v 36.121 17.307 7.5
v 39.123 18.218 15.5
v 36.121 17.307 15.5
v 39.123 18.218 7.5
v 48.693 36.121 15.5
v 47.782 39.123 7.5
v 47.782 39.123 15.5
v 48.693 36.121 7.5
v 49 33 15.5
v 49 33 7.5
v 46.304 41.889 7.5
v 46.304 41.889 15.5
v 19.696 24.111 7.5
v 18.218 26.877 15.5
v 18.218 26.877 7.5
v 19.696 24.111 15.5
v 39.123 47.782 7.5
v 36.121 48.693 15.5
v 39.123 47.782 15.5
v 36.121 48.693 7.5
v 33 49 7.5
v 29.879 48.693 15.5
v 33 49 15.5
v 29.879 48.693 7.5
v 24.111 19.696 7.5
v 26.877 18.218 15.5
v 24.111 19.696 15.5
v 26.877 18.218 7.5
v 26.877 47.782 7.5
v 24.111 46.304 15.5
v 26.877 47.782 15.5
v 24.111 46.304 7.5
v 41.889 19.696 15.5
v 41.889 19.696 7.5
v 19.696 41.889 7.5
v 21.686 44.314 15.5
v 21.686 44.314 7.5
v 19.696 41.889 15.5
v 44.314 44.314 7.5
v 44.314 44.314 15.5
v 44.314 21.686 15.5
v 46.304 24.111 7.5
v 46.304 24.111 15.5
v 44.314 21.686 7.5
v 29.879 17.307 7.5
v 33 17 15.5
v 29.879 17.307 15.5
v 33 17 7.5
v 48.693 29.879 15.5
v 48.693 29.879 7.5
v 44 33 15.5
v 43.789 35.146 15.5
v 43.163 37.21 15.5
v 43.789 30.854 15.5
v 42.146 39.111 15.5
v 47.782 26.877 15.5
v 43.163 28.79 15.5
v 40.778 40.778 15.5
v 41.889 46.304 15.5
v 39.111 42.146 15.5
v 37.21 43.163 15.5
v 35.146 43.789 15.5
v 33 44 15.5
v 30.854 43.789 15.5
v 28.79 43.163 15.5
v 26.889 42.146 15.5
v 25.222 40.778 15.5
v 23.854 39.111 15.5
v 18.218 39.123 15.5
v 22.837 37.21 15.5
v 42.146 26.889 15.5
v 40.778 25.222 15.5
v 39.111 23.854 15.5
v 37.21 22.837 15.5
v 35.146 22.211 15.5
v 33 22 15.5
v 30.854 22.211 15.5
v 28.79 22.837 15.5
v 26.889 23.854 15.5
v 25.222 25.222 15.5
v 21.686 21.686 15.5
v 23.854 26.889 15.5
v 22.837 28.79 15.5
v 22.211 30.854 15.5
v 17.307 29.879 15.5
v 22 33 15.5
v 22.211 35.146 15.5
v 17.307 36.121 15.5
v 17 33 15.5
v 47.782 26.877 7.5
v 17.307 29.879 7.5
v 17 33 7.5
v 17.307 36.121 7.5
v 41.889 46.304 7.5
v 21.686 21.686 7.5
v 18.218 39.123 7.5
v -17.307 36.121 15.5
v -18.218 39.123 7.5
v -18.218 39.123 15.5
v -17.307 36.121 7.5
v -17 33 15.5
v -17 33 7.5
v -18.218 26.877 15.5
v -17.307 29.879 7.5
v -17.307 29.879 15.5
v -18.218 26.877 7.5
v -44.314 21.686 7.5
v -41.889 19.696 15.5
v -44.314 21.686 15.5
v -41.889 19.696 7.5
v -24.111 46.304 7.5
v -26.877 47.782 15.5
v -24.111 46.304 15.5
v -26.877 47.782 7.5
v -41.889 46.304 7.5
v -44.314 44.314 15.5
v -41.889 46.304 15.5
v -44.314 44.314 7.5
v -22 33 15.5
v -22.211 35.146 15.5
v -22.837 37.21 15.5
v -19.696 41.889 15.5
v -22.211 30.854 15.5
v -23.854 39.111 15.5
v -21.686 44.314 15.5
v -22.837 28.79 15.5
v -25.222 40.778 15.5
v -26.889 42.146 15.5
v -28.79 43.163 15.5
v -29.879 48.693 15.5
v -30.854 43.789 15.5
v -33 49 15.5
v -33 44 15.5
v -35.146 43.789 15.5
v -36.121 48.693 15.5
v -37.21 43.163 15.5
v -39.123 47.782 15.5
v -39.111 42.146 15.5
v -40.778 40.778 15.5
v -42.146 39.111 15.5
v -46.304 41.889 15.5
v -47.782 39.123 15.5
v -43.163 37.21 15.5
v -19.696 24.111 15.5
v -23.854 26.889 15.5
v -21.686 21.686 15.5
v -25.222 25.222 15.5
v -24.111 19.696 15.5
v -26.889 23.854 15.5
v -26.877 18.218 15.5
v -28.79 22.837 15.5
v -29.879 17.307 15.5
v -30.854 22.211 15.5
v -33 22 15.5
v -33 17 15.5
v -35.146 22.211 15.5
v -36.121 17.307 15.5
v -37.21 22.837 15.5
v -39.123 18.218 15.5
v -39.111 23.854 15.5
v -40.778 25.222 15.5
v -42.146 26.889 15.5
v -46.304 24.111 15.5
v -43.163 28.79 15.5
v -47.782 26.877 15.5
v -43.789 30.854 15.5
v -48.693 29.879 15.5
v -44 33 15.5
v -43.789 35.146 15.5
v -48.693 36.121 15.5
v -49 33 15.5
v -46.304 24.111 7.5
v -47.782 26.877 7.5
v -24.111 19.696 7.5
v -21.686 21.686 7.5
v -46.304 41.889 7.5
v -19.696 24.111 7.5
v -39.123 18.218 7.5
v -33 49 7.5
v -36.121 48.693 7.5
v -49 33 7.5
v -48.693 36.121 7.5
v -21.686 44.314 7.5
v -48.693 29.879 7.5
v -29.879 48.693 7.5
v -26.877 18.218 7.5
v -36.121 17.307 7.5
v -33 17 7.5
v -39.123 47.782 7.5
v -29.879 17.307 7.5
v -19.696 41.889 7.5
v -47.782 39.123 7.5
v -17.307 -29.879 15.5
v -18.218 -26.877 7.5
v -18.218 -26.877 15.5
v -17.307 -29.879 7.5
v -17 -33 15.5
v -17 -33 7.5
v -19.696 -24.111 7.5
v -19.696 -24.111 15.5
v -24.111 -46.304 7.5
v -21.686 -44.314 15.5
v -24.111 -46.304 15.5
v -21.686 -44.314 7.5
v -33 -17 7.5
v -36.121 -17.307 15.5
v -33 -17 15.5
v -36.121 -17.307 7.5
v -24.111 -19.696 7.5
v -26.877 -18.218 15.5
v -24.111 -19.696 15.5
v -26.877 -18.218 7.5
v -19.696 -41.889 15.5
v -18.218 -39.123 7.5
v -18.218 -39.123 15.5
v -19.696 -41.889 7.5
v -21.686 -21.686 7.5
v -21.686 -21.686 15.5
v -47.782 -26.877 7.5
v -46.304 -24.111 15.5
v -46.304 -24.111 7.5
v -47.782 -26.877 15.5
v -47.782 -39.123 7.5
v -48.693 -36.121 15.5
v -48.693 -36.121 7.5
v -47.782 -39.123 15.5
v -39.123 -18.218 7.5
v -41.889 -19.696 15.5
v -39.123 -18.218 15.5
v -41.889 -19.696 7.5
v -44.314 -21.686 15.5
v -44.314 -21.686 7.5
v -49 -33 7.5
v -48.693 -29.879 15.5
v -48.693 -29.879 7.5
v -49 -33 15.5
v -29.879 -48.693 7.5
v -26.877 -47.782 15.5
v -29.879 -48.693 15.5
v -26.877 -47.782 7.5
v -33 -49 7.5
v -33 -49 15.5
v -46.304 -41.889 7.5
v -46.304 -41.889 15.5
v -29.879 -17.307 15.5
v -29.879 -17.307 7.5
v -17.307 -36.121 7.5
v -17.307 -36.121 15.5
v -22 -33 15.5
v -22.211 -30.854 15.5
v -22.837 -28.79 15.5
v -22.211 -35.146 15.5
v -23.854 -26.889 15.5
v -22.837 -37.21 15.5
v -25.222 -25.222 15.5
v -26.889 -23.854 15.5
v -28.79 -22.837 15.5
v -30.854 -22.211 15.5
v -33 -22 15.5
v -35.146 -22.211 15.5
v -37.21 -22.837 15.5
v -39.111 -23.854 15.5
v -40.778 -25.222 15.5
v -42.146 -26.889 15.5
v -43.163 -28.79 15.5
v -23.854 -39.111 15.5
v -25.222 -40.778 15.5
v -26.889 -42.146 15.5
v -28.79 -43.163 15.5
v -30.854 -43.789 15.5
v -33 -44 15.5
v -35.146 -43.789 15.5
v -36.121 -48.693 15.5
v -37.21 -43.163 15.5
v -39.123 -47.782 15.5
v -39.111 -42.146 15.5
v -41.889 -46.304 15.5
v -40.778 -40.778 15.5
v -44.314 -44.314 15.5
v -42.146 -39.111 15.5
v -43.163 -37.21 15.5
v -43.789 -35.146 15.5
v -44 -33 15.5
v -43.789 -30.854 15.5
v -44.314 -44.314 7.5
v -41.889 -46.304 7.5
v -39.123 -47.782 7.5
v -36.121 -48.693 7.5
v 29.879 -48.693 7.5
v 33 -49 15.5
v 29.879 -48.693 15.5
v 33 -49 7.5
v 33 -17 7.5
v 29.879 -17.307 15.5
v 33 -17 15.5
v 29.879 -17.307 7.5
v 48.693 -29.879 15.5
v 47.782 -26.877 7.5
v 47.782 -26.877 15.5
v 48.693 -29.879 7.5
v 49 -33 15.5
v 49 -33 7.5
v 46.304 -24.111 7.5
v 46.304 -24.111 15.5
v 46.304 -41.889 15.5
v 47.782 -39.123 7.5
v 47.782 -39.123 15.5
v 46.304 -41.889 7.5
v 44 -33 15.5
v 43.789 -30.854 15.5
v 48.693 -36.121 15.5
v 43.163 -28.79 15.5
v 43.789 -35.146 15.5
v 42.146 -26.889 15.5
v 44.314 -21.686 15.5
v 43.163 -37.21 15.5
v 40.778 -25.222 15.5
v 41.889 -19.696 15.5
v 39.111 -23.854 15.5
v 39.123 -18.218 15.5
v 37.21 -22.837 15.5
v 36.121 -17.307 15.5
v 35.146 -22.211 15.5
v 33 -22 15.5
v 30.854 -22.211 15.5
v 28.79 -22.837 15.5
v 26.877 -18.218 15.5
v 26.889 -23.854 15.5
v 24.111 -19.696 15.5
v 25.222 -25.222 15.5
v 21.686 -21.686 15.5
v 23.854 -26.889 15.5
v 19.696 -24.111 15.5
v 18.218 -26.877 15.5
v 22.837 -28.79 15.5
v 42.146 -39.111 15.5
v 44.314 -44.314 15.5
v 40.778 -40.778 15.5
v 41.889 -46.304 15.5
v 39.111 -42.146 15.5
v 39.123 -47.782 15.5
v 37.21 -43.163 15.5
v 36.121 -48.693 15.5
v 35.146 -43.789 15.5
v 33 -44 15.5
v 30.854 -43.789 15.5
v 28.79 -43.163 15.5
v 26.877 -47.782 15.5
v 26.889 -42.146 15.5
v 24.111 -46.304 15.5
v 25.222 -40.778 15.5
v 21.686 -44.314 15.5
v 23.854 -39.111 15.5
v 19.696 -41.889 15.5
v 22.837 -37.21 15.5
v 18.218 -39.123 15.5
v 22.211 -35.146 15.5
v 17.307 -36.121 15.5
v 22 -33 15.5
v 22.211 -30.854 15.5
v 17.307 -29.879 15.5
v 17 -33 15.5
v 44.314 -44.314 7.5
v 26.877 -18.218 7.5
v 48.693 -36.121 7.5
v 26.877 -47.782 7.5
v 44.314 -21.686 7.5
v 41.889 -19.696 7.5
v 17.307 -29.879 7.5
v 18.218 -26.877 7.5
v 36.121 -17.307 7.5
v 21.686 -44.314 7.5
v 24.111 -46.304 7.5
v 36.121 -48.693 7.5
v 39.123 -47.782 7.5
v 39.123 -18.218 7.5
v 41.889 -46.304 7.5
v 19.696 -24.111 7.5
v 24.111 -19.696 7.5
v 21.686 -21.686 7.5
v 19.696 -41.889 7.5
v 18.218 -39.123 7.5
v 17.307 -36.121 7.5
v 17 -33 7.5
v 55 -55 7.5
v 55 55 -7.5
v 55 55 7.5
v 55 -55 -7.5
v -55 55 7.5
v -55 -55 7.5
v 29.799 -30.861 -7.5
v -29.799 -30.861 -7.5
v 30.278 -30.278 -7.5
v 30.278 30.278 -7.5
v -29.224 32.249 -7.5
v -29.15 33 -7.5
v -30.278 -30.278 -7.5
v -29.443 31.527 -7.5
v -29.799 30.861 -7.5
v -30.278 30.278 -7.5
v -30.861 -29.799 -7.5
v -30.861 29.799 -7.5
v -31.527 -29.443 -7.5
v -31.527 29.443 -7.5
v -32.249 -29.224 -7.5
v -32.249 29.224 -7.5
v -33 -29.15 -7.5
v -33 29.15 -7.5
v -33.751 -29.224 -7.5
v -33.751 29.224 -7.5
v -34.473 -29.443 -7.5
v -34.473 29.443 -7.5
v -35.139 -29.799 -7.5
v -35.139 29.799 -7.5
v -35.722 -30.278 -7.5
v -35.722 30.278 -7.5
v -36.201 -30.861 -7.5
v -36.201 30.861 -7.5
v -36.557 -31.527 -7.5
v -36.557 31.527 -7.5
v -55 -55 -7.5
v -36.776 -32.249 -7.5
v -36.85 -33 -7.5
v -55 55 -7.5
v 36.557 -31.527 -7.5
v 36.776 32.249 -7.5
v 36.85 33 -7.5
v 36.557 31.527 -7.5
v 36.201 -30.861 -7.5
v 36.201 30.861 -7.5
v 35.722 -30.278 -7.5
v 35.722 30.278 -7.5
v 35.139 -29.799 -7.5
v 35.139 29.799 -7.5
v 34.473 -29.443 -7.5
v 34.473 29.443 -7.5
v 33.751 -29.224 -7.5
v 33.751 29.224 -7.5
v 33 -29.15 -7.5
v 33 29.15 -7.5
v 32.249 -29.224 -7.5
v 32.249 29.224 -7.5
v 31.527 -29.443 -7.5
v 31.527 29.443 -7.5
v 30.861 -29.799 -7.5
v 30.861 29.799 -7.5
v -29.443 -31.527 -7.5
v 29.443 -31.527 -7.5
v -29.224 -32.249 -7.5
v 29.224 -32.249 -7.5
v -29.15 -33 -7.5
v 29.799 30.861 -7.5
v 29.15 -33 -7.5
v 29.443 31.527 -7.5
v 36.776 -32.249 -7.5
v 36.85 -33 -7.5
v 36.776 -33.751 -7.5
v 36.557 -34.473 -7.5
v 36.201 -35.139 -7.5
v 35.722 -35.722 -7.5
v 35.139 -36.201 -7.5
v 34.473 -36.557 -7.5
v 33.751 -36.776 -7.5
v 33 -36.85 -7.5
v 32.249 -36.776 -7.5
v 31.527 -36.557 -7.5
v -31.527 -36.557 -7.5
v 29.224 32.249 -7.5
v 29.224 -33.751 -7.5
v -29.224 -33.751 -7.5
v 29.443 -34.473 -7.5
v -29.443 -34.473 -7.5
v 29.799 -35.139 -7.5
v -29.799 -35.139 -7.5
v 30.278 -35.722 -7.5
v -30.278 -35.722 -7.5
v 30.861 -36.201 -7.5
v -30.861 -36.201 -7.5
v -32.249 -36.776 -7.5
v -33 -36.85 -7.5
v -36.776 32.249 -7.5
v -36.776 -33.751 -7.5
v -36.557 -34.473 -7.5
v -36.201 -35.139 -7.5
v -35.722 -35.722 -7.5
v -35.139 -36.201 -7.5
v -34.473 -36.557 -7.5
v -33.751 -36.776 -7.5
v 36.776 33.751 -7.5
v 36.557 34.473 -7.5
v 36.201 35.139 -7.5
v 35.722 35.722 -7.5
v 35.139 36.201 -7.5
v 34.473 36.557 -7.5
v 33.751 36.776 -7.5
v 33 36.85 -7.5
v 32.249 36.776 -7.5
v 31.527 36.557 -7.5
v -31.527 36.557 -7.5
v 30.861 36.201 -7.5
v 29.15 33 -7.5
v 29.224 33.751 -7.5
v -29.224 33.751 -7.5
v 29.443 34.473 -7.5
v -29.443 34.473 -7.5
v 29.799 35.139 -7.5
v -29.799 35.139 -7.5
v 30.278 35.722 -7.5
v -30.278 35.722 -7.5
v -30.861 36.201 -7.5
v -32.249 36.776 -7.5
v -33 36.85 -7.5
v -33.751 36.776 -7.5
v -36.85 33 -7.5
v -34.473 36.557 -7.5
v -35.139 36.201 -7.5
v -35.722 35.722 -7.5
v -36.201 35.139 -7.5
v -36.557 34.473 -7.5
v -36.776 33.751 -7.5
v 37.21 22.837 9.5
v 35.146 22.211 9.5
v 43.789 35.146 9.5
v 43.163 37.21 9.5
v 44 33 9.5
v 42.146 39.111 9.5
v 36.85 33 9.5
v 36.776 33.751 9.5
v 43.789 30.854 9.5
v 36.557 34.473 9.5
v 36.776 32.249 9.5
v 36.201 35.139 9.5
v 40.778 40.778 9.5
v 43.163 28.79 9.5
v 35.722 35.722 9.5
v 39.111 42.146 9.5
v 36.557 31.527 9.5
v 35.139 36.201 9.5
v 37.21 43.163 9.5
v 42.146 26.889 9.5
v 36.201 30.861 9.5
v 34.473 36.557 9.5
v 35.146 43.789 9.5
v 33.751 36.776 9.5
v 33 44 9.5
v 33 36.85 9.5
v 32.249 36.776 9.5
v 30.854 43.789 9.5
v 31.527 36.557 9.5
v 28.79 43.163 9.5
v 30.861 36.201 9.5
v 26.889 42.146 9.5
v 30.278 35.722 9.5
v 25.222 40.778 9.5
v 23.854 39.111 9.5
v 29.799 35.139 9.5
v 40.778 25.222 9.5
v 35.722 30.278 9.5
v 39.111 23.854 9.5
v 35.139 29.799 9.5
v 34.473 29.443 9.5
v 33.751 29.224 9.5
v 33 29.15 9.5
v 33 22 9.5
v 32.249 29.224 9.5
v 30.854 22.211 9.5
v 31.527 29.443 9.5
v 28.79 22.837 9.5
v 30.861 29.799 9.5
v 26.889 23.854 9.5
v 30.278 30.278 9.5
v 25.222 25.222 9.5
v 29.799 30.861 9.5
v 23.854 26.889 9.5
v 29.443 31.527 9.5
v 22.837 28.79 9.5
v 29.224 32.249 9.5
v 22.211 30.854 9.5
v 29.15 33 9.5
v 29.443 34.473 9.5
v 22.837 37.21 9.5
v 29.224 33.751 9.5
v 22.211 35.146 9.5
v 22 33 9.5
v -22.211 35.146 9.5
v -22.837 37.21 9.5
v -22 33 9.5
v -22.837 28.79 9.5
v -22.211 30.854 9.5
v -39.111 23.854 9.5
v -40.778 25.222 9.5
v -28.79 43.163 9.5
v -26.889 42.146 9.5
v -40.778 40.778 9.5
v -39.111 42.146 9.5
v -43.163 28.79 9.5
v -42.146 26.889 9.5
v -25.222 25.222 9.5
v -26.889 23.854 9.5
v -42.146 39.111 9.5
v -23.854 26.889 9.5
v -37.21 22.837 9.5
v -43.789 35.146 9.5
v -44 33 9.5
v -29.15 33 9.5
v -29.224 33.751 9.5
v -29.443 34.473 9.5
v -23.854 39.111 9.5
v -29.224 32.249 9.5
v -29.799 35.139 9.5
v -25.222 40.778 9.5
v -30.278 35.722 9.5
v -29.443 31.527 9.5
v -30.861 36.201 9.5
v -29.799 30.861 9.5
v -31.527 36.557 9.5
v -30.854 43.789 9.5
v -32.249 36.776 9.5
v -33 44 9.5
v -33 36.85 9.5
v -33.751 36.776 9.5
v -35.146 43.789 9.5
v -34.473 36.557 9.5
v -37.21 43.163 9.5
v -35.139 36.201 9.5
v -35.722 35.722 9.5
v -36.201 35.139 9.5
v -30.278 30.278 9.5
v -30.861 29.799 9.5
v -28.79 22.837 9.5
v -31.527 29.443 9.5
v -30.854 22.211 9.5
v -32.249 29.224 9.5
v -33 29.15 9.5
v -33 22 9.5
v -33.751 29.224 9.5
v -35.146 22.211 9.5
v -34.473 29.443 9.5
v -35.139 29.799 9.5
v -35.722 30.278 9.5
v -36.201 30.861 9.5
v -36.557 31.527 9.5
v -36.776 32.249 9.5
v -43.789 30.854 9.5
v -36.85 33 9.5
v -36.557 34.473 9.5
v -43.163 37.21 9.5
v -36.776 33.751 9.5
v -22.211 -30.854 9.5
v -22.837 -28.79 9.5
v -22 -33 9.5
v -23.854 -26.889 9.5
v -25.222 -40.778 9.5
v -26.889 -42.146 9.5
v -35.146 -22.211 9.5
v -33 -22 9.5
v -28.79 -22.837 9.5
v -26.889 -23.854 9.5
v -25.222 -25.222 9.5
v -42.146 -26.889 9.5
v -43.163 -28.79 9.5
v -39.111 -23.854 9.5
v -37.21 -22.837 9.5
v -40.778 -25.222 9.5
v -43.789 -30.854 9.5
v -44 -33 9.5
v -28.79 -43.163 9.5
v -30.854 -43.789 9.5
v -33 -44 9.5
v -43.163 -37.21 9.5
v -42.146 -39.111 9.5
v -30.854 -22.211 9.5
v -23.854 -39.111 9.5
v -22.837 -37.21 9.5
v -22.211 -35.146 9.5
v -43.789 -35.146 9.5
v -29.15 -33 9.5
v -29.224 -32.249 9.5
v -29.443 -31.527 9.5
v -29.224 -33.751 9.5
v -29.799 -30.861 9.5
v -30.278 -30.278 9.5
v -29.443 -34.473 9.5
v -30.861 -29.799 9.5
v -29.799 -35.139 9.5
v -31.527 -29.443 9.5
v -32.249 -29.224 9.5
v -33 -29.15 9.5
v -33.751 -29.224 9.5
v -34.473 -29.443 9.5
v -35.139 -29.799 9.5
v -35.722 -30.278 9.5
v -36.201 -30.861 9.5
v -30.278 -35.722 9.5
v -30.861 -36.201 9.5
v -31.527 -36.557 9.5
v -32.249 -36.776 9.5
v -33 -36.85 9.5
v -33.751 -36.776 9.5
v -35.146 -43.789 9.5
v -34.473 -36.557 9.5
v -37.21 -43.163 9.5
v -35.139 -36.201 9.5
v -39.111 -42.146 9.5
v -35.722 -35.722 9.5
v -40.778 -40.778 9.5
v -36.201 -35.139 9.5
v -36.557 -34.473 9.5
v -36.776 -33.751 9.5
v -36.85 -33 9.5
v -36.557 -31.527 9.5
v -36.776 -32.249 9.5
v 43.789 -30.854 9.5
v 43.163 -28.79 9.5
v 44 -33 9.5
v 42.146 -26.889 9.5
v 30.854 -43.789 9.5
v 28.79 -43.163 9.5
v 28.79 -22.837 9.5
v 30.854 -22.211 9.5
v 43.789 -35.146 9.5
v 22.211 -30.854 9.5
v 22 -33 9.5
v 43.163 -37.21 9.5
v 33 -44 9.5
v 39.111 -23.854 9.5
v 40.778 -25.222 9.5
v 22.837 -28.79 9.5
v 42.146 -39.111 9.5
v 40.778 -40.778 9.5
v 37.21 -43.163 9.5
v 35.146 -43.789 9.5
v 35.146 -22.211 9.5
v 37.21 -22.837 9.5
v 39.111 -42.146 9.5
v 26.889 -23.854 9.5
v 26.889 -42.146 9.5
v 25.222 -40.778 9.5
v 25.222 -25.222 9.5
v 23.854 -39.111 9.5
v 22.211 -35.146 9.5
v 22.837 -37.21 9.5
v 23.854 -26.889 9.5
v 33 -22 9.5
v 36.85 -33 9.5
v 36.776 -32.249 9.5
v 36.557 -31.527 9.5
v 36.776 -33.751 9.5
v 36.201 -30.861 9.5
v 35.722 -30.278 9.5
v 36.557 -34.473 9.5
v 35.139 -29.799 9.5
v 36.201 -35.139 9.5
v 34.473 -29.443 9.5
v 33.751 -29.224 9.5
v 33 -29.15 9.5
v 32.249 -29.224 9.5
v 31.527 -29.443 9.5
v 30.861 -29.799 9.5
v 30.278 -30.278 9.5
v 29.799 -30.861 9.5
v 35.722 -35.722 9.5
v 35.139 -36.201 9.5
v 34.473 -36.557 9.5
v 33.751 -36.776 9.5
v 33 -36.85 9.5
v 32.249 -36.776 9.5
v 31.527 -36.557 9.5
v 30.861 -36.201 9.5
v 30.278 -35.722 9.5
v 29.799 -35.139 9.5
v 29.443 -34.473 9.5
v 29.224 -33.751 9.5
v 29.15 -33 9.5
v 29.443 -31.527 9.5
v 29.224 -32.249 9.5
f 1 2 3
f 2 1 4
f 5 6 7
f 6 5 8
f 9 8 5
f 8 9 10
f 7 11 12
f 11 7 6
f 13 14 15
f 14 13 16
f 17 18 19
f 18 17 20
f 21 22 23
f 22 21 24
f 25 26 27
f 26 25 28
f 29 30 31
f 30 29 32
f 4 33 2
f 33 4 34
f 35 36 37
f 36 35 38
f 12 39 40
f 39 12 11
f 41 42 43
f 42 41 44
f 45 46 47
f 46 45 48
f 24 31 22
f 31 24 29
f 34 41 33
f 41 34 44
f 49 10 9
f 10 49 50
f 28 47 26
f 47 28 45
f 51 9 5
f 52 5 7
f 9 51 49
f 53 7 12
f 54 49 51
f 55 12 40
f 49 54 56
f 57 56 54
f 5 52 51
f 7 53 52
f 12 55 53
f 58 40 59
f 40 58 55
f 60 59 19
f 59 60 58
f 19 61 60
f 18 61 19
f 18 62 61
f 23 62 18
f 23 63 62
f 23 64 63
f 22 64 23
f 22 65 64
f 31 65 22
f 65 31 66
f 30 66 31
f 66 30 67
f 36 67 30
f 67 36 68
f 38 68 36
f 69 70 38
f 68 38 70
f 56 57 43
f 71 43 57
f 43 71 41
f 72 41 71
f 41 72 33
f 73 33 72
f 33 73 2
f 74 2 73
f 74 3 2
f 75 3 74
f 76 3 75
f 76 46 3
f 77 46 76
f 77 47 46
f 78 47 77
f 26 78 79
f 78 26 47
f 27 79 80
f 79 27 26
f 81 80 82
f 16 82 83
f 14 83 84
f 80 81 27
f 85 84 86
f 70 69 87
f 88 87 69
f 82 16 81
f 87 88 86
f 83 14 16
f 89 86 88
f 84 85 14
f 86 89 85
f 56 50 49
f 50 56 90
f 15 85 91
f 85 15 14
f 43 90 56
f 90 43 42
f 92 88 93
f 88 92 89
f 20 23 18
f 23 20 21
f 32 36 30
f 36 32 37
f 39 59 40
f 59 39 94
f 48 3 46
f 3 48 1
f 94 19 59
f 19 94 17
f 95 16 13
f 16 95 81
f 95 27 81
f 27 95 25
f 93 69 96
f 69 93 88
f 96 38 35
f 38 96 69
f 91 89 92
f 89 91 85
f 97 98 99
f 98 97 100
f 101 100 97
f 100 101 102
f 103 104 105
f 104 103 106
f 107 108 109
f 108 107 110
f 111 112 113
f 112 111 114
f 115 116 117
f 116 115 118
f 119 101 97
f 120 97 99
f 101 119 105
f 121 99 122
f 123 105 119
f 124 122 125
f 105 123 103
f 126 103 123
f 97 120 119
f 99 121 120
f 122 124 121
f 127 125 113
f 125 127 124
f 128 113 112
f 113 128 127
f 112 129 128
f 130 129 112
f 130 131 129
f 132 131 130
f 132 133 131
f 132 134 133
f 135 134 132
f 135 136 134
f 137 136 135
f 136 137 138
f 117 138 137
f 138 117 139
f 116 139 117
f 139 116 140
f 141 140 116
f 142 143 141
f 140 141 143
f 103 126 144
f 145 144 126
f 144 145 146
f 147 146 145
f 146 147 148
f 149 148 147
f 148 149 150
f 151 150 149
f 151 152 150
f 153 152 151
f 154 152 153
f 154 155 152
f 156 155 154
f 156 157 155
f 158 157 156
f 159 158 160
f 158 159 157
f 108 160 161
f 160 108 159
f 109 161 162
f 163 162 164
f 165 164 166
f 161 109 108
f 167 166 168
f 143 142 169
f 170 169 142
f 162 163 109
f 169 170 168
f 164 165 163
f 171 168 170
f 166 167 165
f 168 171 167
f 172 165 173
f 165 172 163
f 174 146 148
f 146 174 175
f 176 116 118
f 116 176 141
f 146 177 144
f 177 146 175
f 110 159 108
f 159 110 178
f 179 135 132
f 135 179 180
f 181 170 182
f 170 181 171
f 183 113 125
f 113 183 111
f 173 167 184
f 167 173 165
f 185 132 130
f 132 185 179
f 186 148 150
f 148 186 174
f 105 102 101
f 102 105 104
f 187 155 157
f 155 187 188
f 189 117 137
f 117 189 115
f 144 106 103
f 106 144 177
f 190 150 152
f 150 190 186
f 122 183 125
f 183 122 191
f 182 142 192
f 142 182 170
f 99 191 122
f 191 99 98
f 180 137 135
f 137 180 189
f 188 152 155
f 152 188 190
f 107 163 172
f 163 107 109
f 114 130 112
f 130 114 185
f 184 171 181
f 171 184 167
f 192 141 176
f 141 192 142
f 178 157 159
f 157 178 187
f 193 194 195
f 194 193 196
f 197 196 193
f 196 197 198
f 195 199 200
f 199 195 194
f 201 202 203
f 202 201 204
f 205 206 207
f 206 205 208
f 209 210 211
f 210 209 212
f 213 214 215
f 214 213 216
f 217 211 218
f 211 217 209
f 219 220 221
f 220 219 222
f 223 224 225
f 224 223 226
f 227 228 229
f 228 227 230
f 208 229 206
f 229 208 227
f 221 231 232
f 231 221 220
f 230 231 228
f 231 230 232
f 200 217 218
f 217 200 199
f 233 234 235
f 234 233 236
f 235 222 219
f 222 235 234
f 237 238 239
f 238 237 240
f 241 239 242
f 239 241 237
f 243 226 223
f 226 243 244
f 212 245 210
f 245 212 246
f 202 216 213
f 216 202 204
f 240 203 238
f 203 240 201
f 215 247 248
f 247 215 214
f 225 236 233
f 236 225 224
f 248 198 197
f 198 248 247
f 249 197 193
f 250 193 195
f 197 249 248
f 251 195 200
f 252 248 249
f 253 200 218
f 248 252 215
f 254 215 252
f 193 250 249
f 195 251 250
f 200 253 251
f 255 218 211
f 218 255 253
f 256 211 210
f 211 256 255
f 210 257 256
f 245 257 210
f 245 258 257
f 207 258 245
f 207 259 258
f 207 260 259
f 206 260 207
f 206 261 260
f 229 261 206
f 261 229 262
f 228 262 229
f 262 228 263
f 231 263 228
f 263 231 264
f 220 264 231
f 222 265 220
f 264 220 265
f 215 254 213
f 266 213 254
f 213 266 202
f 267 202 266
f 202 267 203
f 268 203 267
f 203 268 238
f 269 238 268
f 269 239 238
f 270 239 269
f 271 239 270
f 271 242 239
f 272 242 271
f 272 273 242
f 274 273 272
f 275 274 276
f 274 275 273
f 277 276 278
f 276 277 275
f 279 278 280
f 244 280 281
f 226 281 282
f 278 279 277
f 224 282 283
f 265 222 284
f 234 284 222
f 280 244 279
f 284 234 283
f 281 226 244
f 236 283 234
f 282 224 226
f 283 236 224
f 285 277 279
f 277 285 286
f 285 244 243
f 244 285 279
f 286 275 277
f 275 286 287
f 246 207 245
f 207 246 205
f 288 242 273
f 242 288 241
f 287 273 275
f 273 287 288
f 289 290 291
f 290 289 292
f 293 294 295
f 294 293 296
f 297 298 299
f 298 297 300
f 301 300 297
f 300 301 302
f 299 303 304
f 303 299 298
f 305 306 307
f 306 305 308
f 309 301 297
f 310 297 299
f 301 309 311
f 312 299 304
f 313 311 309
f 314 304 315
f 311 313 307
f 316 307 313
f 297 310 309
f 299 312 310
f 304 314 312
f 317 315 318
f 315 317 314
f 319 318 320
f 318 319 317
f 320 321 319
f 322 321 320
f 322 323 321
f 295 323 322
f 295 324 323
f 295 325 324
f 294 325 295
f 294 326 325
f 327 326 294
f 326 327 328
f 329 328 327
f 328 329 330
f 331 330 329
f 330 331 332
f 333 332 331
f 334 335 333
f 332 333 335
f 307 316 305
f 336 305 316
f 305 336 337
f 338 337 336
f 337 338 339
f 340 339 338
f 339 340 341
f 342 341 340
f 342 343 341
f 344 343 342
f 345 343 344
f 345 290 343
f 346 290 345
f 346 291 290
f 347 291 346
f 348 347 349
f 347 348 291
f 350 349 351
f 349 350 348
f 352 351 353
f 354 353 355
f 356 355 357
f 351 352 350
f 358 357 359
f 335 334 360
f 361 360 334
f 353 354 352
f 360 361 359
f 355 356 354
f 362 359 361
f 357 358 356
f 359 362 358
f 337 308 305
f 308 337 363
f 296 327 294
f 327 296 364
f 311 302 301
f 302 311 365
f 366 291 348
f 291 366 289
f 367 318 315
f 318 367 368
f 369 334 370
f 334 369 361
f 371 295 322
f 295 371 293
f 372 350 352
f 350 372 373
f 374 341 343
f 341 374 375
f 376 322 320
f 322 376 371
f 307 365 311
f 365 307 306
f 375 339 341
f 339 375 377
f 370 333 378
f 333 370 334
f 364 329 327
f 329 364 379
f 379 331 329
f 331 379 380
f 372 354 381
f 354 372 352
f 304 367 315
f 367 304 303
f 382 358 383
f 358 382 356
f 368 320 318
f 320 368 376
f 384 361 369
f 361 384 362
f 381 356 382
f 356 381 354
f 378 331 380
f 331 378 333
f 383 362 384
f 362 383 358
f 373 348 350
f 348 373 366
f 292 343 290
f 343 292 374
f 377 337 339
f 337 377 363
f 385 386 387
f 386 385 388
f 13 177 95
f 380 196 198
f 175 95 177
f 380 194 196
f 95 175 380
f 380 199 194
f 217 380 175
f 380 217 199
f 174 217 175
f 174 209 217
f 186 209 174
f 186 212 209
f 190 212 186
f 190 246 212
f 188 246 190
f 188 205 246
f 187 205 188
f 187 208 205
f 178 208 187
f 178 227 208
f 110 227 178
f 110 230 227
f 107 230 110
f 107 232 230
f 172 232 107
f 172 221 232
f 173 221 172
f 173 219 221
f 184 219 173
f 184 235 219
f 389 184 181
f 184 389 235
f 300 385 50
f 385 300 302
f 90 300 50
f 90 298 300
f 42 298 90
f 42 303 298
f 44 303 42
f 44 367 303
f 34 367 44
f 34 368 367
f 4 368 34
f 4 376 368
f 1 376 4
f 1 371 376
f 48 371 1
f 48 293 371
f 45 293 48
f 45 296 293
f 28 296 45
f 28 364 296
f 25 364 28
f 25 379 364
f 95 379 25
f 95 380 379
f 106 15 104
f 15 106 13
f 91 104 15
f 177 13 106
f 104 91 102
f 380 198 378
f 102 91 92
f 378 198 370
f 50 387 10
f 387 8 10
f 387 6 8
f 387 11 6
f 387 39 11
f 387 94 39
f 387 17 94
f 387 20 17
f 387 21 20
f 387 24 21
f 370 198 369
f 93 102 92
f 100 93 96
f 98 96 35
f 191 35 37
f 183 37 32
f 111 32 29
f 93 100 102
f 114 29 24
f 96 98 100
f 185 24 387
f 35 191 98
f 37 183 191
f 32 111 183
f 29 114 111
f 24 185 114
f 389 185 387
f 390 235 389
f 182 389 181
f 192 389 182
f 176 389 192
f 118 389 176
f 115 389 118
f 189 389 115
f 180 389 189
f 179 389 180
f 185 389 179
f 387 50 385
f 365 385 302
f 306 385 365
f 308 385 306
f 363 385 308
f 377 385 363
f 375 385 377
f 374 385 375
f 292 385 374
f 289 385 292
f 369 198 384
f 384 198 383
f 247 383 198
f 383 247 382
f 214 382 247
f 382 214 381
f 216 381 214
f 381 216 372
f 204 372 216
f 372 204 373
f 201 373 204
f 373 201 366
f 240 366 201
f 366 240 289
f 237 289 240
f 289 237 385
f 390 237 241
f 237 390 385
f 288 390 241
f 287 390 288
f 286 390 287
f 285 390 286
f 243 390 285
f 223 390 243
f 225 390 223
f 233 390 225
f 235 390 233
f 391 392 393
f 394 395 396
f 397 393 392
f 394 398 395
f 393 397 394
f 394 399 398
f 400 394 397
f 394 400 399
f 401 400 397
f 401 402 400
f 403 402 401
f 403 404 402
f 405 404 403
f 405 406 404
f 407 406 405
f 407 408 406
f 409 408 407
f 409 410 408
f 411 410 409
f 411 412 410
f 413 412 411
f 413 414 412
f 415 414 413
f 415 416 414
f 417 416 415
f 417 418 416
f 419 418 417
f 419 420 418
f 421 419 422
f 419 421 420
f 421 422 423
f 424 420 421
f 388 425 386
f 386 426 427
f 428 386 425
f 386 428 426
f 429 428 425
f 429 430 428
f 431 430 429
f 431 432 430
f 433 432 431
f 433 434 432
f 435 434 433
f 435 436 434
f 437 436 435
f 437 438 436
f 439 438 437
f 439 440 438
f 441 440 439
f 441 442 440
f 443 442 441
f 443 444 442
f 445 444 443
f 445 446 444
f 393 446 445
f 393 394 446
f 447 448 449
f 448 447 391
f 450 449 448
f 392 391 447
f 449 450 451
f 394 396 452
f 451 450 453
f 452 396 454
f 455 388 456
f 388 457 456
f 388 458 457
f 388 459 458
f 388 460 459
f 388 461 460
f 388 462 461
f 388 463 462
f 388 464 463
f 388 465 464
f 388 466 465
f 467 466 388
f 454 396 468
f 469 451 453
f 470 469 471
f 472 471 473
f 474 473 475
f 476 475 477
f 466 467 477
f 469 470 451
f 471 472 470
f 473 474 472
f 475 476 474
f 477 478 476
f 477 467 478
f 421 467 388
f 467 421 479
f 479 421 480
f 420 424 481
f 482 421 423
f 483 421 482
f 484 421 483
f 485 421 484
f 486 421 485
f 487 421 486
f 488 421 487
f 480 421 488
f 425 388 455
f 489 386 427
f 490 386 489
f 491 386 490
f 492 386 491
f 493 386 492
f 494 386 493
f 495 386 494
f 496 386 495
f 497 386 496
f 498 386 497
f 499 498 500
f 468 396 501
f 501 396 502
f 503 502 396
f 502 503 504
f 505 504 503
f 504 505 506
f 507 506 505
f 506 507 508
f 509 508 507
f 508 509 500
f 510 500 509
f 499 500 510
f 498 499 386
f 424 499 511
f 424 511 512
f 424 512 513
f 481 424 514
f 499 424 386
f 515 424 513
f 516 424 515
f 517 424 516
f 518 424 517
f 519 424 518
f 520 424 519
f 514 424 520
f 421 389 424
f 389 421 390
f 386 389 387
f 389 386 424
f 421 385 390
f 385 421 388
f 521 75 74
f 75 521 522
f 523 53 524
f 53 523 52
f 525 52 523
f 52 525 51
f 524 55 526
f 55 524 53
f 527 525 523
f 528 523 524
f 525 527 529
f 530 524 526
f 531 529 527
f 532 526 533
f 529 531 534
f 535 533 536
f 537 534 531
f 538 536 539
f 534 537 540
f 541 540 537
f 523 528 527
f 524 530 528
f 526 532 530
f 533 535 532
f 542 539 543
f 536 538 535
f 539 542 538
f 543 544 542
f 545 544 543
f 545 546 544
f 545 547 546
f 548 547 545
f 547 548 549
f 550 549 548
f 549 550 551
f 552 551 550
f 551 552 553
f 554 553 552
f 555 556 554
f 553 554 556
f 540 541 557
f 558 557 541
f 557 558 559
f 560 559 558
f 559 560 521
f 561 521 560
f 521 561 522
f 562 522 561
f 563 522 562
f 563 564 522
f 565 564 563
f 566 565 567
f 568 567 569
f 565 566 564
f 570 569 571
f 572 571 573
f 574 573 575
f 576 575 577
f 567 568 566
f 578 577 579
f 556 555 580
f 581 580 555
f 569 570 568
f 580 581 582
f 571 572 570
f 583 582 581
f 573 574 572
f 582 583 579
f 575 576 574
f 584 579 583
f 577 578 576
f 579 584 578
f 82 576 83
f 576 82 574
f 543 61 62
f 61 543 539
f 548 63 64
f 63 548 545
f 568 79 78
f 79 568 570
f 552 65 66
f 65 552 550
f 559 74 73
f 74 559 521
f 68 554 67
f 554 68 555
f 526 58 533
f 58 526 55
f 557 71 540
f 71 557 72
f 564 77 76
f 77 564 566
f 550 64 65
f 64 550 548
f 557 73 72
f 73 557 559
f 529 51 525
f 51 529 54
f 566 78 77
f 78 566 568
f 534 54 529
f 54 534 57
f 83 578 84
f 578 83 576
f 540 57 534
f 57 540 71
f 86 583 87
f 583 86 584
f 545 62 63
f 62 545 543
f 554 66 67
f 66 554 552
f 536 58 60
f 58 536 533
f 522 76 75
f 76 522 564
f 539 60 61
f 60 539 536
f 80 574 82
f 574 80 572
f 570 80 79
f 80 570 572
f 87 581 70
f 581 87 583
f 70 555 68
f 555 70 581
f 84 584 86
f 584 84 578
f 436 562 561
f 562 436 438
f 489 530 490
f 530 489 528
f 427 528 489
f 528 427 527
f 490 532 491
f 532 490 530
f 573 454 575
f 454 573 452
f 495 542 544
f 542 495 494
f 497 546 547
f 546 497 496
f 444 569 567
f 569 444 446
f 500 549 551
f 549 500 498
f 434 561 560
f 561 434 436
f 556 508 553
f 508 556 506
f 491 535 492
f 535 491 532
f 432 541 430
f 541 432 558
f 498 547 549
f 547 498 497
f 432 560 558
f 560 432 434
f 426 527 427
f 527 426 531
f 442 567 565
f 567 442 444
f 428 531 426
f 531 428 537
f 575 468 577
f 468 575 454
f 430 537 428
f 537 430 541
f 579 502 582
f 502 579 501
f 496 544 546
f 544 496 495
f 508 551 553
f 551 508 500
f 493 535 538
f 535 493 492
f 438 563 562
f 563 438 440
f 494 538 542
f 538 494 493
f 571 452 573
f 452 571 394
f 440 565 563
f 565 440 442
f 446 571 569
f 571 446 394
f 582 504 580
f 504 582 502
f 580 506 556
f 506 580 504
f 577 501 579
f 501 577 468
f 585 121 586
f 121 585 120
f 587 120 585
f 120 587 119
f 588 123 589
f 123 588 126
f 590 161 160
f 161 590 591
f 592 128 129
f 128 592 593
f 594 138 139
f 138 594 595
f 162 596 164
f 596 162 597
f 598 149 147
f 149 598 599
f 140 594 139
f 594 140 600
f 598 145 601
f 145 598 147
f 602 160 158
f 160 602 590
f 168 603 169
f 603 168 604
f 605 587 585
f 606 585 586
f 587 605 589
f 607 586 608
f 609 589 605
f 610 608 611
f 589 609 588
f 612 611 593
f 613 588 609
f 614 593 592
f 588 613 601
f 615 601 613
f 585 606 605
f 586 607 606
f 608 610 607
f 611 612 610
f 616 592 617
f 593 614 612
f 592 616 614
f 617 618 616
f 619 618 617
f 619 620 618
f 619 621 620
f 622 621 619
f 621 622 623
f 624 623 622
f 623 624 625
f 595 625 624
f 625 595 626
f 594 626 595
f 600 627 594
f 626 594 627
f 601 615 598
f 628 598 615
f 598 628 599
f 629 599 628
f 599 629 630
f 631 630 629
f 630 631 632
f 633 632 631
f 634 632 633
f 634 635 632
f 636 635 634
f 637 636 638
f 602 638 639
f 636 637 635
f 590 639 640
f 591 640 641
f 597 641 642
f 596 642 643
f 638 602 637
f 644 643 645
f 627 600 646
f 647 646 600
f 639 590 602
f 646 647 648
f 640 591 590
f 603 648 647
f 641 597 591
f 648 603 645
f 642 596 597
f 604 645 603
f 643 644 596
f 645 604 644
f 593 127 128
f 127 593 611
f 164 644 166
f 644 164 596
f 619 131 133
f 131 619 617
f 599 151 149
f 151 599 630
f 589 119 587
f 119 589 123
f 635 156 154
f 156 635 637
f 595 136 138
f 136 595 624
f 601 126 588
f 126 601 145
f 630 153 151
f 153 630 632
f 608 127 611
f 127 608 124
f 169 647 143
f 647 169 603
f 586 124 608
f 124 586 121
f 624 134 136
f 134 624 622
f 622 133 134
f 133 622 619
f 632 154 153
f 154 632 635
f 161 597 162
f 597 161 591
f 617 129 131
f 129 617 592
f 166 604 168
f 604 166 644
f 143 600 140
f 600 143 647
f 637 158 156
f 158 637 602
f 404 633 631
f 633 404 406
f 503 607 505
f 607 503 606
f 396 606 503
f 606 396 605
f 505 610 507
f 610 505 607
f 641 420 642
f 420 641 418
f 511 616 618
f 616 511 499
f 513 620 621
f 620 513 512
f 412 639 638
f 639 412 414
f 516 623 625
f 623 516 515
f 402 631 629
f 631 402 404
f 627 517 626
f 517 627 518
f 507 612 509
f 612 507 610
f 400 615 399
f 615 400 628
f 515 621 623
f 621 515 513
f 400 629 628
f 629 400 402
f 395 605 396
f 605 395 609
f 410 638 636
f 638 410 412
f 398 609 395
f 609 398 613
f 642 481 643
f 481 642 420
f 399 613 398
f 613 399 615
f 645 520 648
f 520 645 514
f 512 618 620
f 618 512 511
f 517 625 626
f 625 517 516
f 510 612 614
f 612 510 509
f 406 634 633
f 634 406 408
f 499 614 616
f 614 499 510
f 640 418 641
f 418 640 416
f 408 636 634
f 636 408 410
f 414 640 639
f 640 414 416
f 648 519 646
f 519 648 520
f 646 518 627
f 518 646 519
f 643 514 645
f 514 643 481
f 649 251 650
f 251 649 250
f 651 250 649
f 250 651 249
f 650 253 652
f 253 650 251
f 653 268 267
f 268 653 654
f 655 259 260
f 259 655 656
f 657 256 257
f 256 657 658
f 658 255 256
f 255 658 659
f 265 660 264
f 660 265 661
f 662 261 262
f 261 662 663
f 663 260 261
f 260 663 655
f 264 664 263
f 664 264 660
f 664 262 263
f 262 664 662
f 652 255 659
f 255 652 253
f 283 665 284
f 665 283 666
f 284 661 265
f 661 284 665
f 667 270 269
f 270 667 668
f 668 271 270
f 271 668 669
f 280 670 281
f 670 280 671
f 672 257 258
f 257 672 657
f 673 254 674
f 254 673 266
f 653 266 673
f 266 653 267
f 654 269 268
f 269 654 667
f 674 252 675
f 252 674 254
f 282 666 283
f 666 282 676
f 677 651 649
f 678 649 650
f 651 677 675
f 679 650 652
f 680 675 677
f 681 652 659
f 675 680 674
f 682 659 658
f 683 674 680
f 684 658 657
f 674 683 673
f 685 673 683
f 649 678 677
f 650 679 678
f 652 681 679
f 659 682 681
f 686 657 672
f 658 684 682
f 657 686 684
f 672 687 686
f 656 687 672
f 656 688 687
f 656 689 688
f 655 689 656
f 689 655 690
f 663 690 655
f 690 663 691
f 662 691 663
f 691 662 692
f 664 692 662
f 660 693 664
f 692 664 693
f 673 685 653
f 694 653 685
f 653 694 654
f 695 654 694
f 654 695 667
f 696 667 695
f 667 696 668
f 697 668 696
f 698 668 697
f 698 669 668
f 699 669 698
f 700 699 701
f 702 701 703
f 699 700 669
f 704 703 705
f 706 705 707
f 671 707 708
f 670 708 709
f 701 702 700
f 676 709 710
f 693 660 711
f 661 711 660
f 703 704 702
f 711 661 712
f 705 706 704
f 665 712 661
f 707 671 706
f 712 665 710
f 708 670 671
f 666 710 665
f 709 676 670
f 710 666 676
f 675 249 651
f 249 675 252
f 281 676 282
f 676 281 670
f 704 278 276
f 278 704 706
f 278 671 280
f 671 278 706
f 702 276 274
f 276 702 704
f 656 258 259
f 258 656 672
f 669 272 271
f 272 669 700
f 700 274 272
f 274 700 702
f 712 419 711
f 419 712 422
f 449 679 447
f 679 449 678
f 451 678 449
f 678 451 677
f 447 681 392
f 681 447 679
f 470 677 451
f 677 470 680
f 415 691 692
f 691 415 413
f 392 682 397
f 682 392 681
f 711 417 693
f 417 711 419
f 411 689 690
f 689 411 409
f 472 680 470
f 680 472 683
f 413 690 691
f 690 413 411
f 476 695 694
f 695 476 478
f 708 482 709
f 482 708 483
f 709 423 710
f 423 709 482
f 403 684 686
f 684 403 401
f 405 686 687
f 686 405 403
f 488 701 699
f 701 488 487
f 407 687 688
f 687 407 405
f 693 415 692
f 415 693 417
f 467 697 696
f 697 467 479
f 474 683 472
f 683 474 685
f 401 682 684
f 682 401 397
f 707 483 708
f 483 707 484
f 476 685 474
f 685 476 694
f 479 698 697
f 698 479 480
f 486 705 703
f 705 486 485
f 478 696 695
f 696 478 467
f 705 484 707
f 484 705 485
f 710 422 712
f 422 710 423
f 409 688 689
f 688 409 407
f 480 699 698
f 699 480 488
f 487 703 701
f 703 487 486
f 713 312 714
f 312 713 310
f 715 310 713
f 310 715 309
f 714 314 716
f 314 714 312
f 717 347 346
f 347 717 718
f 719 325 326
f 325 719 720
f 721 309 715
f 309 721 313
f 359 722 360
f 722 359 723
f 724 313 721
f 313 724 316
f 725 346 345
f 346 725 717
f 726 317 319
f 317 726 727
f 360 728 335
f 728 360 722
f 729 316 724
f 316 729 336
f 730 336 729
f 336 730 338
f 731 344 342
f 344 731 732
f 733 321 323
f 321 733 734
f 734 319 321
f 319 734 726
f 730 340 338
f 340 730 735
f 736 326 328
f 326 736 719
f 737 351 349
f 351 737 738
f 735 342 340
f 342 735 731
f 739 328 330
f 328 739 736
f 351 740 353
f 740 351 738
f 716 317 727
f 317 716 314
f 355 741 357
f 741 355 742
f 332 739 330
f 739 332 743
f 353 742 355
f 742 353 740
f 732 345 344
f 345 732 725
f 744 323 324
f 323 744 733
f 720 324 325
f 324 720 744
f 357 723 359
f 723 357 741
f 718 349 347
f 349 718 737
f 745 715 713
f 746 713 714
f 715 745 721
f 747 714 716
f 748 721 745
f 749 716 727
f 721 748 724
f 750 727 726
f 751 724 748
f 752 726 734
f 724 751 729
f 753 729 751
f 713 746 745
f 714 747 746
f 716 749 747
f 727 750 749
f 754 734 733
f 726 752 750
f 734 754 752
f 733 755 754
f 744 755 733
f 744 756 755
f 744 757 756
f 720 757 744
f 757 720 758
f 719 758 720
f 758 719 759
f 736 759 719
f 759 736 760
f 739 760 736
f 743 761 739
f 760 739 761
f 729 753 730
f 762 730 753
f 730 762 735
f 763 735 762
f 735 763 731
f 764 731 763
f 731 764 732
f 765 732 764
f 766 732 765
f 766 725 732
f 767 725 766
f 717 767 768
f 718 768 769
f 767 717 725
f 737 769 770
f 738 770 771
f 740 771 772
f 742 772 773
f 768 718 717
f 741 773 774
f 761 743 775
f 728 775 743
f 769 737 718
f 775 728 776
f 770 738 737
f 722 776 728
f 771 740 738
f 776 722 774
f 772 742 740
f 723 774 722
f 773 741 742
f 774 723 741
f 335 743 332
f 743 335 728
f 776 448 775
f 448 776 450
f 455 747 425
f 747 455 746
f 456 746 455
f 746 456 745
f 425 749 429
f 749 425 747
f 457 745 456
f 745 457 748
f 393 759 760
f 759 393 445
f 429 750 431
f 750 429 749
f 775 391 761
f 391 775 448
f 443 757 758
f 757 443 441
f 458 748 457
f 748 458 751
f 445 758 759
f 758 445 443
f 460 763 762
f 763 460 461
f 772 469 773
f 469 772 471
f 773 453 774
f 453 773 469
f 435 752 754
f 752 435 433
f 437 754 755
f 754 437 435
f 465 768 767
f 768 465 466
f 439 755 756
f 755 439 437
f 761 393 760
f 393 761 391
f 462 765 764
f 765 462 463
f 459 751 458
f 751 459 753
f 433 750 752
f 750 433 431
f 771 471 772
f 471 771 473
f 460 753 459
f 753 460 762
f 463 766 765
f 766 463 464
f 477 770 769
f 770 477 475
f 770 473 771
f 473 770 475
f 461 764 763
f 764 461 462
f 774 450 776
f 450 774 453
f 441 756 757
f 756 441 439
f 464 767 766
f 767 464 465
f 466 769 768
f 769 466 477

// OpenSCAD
$fn = 32;

// ----------------------------------------------------------------------
// Socket pad plate
// bosses with counterbored sockets for the screws
// ----------------------------------------------------------------------

// --- parameters (mm) ---
base_t = 15;             // base plate thickness
boss_h = 8;              // boss height above the base plate
boss_d = 32;             // boss diameter
socket_d = 22;           // socket diameter
socket_depth = 6;        // socket depth from the boss face
bolt_d = 7.7;            // screw clearance hole through the socket floor
plate = [110, 110, 15];  // overall size (x, y, z)
edge = 22;               // boss centre offset from the plate edge
pads = 4;                // boss count, one per corner

// --- derived feature positions (mm) ---
height = base_t + boss_h;        // = 23   overall height of the part
corner_x = plate[0] / 2 - edge;  // = 33   boss centre X
corner_y = plate[1] / 2 - edge;  // = 33   boss centre Y
feature_centers = [
  [corner_x, corner_y],
  [-corner_x, corner_y],
  [-corner_x, -corner_y],
  [corner_x, -corner_y]
];   // boss centres: sockets, holes and the pads themselves are placed from here

// base plate, bosses on feature_centers, socket + through hole in each
difference() {
  union() {
    cube(plate, center = true);
    for (centre = feature_centers)
      translate([centre[0], centre[1], plate[2] / 2 - 1])
        cylinder(d = boss_d, h = boss_h + 1);
  }
  for (centre = feature_centers) {
    translate([centre[0], centre[1], plate[2] / 2 + boss_h - socket_depth])
      cylinder(d = socket_d, h = socket_depth + 1);
    translate([centre[0], centre[1], -height])
      cylinder(d = bolt_d, h = 2 * height + 2);  // through the socket floor
  }
}
